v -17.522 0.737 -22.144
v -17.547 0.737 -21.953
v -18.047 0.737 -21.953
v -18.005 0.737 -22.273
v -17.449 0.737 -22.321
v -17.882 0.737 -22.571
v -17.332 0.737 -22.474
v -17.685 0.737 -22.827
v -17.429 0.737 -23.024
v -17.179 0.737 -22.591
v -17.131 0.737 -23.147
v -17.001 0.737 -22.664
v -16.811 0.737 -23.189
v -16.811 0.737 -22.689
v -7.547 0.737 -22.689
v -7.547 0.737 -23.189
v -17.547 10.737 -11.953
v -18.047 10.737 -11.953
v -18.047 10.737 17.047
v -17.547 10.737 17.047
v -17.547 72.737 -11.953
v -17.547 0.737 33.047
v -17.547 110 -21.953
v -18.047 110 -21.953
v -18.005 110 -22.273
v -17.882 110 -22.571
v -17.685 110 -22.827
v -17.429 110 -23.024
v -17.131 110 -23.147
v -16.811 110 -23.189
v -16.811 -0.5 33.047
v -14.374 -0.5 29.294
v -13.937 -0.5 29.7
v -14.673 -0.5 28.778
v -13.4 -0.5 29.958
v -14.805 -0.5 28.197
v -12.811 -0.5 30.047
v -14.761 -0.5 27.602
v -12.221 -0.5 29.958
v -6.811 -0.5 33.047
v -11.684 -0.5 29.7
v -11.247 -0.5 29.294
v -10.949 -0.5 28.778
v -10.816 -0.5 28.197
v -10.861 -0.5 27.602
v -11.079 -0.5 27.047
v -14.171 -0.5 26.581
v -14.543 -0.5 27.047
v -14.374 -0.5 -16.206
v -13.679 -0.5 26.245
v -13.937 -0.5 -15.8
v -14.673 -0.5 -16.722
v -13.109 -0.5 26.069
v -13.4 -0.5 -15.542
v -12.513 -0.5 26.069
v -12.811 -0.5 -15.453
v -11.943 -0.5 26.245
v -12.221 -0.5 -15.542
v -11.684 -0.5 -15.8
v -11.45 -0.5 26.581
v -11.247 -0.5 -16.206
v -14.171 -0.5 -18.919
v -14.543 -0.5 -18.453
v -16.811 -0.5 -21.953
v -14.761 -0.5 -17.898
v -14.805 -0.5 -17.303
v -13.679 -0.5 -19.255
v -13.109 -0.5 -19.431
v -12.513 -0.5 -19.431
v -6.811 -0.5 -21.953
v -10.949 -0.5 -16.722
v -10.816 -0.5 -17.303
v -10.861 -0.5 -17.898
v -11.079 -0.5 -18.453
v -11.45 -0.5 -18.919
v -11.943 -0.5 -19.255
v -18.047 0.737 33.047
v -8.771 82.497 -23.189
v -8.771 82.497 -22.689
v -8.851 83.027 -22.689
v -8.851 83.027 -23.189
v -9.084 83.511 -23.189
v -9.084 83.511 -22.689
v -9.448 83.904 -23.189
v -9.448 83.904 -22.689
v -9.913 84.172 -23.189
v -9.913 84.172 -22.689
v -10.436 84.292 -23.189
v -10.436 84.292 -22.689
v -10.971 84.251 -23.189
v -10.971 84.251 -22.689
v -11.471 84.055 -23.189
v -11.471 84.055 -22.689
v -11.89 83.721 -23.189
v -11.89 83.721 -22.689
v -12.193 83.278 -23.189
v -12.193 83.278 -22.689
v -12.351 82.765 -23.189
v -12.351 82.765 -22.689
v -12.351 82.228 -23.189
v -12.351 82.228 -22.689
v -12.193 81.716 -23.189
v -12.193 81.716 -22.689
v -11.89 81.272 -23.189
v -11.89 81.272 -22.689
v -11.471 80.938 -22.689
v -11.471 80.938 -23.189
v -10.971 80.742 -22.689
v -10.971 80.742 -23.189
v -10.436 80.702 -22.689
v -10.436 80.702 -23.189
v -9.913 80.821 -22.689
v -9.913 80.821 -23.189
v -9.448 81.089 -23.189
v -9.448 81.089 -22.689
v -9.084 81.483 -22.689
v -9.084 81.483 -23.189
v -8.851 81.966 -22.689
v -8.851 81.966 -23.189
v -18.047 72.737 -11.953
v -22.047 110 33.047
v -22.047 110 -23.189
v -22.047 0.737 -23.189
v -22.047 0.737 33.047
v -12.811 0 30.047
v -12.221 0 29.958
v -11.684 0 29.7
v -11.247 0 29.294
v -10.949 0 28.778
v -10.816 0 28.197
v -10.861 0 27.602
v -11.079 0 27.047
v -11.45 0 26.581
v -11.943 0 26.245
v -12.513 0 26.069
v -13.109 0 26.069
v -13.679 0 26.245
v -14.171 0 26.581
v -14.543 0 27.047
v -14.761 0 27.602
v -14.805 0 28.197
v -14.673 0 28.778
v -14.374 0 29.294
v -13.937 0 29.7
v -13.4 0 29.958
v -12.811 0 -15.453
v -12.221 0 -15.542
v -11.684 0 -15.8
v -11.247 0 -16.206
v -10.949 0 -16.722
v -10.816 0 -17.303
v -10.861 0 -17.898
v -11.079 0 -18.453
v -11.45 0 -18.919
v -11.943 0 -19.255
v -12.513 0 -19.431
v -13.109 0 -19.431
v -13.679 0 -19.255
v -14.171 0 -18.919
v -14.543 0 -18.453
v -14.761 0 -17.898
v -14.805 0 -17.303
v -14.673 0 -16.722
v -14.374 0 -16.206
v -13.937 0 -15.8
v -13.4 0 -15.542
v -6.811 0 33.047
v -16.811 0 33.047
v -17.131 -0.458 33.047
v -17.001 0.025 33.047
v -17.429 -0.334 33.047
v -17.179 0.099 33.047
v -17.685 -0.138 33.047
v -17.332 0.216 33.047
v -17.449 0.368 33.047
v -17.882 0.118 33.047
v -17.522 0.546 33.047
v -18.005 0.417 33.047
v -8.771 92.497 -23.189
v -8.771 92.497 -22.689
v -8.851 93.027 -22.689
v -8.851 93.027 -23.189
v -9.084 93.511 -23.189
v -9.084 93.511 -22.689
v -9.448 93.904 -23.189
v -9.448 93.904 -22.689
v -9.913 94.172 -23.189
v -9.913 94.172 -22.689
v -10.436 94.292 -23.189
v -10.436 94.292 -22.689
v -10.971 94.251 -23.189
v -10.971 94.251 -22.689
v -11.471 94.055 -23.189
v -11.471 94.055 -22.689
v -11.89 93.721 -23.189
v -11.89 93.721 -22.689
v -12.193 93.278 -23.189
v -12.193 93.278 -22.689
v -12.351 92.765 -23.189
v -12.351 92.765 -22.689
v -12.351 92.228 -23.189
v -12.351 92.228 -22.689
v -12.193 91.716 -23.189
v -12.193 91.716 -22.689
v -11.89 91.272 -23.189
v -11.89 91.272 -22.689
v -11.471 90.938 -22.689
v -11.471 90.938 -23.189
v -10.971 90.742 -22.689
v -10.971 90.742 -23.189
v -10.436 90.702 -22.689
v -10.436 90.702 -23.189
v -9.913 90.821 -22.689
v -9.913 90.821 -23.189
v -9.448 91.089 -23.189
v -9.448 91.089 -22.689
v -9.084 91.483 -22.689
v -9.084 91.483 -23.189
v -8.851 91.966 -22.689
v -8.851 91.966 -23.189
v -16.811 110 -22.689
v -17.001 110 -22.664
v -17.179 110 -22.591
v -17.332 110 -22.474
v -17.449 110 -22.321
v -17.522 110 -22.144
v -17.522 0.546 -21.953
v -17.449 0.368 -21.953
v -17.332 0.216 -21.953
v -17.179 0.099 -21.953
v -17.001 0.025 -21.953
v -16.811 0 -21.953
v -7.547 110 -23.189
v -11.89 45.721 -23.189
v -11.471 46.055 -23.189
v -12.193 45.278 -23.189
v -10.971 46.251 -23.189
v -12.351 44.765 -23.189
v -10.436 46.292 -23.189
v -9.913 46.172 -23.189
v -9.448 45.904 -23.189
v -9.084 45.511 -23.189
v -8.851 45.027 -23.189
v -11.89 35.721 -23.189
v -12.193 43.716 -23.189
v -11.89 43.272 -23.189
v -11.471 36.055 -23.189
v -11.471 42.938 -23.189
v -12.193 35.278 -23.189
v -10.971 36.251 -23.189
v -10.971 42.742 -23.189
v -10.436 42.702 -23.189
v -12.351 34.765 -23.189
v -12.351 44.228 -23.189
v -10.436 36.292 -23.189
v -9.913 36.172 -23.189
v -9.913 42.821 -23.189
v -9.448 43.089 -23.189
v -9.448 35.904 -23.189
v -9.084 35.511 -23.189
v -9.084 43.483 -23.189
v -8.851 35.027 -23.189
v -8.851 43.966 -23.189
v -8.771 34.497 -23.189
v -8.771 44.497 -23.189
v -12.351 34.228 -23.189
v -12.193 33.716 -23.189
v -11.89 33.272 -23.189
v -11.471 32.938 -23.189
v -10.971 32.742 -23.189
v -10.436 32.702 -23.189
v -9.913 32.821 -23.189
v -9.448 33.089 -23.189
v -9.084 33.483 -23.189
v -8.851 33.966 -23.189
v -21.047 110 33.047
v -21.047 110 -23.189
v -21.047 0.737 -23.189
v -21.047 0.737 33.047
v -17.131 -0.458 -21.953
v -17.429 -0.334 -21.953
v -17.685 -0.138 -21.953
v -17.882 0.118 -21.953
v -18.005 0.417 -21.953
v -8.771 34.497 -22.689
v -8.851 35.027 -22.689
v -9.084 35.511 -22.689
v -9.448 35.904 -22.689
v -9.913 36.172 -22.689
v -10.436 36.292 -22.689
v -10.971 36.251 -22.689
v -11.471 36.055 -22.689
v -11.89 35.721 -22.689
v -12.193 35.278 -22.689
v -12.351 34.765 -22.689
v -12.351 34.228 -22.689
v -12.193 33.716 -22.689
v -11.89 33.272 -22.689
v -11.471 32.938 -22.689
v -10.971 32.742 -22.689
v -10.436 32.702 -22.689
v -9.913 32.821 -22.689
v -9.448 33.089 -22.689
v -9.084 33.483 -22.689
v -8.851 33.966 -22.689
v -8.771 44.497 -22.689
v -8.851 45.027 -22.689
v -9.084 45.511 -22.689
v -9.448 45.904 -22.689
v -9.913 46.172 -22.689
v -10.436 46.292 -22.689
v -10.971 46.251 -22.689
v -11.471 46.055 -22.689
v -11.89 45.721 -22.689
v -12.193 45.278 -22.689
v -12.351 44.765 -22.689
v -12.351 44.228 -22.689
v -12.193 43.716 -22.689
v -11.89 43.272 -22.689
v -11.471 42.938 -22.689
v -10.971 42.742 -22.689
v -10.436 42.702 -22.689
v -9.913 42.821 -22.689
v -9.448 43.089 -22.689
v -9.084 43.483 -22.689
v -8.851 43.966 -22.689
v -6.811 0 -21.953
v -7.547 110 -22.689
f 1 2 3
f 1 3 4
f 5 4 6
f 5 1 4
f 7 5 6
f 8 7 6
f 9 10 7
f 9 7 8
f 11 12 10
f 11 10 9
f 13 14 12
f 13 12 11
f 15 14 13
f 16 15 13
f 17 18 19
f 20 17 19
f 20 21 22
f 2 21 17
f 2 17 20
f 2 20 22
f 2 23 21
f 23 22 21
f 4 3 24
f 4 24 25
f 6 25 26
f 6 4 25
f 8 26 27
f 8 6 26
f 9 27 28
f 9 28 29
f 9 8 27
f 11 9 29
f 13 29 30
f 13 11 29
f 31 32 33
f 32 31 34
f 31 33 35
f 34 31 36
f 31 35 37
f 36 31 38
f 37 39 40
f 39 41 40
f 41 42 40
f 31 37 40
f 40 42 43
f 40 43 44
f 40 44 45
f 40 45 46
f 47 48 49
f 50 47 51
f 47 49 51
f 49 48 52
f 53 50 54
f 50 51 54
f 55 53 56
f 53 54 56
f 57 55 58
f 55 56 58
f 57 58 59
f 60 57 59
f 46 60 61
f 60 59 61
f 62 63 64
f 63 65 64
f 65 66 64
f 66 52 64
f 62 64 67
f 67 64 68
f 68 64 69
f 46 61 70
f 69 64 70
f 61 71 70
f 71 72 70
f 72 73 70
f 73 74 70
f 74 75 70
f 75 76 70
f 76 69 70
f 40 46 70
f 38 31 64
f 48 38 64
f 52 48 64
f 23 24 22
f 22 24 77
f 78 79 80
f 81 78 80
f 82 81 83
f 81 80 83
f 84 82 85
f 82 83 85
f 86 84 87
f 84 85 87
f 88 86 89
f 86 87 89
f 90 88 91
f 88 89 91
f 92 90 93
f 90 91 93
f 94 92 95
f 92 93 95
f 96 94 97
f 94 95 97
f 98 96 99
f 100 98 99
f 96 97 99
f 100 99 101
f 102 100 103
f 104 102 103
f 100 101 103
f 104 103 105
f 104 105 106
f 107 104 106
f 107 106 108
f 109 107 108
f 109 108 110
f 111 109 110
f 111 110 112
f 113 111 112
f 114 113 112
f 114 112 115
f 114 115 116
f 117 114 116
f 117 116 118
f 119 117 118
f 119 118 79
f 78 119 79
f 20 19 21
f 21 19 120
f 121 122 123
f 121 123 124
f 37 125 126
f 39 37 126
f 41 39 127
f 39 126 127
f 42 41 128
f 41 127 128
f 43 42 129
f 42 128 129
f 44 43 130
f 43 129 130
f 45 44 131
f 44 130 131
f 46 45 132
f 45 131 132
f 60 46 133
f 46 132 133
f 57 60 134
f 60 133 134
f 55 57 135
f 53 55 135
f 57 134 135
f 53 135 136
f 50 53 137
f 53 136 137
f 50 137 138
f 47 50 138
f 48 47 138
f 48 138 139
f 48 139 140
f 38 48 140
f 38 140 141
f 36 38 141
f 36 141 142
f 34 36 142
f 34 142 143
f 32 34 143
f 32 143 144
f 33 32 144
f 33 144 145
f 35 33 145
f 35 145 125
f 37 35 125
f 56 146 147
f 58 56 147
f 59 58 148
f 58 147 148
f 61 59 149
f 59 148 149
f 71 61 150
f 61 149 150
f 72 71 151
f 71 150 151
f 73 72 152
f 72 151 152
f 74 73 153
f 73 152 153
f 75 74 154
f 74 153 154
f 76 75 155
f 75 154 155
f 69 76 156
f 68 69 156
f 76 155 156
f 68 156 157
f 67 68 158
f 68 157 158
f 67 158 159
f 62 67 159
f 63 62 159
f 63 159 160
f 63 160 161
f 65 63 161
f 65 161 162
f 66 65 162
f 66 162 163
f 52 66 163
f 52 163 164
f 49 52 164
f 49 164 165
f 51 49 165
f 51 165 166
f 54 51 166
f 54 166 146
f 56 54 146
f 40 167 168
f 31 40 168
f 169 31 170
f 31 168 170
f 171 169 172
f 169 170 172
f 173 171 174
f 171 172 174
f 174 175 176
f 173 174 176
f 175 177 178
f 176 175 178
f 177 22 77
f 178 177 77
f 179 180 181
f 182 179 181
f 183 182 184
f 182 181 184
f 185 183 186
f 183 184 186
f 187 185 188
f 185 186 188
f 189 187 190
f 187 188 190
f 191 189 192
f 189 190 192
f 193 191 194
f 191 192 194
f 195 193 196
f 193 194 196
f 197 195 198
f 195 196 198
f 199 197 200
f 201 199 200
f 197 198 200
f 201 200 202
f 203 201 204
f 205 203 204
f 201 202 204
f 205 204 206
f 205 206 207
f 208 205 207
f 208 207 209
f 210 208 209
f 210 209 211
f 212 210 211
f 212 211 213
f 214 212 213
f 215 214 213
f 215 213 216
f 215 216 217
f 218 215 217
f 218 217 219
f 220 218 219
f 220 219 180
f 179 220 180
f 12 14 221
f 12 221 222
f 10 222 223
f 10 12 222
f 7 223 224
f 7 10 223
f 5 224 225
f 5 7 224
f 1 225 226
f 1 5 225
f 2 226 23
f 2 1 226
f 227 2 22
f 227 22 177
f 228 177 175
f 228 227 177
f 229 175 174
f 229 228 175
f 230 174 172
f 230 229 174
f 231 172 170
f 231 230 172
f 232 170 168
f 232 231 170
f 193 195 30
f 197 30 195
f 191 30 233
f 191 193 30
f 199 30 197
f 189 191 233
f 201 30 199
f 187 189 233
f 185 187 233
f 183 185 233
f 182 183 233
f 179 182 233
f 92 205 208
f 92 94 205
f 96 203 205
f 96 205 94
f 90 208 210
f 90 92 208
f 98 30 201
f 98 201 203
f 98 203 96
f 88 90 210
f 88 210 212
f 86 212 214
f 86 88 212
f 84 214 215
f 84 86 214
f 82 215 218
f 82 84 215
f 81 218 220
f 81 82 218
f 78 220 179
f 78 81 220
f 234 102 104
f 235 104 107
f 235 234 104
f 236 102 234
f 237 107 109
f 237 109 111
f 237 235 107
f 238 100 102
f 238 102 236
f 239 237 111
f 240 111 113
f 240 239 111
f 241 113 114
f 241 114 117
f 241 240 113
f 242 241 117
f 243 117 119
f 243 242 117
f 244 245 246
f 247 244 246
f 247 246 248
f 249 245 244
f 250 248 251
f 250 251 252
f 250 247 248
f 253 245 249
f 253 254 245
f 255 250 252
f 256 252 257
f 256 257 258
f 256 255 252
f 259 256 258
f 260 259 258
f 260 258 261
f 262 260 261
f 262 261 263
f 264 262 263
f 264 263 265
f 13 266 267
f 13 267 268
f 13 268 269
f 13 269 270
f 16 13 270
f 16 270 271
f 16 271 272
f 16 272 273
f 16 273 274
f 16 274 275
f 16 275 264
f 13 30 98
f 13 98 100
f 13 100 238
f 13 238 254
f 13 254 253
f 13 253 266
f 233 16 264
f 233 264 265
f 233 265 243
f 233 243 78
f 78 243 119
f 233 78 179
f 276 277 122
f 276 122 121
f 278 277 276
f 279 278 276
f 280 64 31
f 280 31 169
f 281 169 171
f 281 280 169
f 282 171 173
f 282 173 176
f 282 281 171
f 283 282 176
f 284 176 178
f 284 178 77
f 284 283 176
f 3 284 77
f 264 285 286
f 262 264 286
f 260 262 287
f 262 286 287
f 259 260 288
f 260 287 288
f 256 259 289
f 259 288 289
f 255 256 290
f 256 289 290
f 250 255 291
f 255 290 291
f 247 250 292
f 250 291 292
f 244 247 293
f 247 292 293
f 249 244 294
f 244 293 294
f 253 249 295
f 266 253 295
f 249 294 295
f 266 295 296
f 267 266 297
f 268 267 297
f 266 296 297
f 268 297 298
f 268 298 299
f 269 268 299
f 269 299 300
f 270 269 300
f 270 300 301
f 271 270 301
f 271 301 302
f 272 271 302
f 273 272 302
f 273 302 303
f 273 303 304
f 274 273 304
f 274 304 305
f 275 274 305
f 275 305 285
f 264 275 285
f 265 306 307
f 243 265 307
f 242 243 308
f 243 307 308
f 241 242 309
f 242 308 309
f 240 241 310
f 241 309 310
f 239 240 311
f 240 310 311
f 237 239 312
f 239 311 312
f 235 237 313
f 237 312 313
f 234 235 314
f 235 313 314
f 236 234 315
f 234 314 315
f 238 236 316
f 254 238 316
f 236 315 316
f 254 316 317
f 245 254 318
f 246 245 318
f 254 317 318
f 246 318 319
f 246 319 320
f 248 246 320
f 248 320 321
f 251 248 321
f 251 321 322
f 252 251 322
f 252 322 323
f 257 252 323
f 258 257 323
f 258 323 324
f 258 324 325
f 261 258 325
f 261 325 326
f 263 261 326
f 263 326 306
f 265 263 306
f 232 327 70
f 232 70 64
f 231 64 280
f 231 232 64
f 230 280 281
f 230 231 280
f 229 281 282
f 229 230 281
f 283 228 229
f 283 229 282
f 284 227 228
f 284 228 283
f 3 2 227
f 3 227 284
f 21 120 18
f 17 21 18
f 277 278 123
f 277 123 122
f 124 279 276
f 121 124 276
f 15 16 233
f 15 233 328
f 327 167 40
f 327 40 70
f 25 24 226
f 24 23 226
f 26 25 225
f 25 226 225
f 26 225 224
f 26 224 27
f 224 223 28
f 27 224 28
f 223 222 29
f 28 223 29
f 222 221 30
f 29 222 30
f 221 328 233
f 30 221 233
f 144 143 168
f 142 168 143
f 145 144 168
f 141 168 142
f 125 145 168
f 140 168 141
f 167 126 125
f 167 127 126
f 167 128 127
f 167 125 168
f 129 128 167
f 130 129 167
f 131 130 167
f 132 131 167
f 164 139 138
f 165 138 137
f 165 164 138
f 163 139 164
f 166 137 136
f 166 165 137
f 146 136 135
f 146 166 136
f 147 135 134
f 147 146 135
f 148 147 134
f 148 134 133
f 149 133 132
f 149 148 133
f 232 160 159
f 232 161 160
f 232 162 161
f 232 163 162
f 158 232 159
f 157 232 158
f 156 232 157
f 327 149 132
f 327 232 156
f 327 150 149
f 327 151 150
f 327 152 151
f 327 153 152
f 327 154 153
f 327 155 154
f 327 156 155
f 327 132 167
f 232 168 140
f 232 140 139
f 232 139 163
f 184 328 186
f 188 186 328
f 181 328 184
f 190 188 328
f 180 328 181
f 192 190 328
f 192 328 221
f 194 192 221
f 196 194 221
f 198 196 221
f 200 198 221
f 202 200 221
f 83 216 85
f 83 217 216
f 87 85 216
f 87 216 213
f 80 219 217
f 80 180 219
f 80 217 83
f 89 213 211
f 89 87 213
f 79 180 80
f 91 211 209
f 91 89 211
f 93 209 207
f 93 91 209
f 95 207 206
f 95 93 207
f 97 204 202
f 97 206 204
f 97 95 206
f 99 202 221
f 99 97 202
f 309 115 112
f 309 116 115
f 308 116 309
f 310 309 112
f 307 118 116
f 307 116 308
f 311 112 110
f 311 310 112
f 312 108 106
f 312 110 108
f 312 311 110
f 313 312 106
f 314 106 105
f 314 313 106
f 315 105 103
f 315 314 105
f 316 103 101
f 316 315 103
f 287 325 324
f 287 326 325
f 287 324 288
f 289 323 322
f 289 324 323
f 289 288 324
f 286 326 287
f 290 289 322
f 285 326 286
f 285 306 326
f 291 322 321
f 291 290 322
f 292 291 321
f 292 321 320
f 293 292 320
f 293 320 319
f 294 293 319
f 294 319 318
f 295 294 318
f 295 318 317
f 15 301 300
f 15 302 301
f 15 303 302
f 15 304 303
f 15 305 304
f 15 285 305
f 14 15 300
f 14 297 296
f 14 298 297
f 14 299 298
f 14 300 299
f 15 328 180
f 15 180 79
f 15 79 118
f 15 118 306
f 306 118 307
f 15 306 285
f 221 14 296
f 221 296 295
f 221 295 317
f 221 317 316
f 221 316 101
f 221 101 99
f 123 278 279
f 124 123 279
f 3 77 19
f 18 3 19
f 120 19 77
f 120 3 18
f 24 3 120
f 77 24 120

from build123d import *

# Parameters (mm, degrees)
SKETCH1_W           = 10
SKETCH1_H           = 55
BASE_FLANGE1_DEPTH  = 0.5
EDGE_FLANGE1_DEPTH  = 55
EDGE_FLANGE2_DEPTH  = 109.2634
SKETCH13_R          = 2
CUT_EXTRUDE1_DEPTH  = 1
CUT_EXTRUDE2_DEPTH  = 10
CUT_EXTRUDE7_DEPTH  = 10
BOSS_EXTRUDE1_START = 3
SKETCH16_W          = 56.2366
SKETCH16_H          = 109.2634
BOSS_EXTRUDE1_DEPTH = 1
SKETCH19_R          = 1.8
CUT_EXTRUDE4_DEPTH  = 10
SKETCH17_R          = 1.8
CUT_EXTRUDE5_DEPTH  = 10
SKETCH20_R          = 1.8
CUT_EXTRUDE6_DEPTH  = 10


# Sheet-metal steps are written as plain solids
with BuildPart() as part:
    # Sketch1 → Base-Flange1 (new body)
    with BuildSketch(Plane(origin=(0, 0, 0), x_dir=(1, 0, 0), z_dir=(0, 1, 0))):
        with Locations((-11.810772495, -5.547108859)):
            Rectangle(SKETCH1_W, SKETCH1_H)
    extrude(amount=-BASE_FLANGE1_DEPTH)

    # Edge-Flange1 section (across the edge) → Edge-Flange1 (add)
    with BuildSketch(Plane(origin=(-17.547372495, 0, -21.952891141), x_dir=(1, 0, 0), z_dir=(0, 0, 1))):
        with BuildLine():
            Line((-0.5, 0.7366), (-0.5, 110))
            Line((-0.5, 110), (0, 110))
            Line((0, 110), (0, 0.7366))
            ThreePointArc((0, 0.7366), (0.215745145, 0.215745145), (0.7366, 0))
            Line((0.7366, 0), (0.7366, -0.5))
            ThreePointArc((0.7366, -0.5), (-0.137808246, -0.137808246), (-0.5, 0.7366))
        make_face()
    extrude(amount=EDGE_FLANGE1_DEPTH)

    # Edge-Flange2 section (across the edge) → Edge-Flange2 (add)
    with BuildSketch(Plane(origin=(-17.547372495, 0.7366, -22.689491141), x_dir=(0, 0, 1), z_dir=(0, 1, 0))):
        with BuildLine():
            Line((-0.5, 0.7366), (-0.5, 10))
            Line((-0.5, 10), (0, 10))
            Line((0, 10), (0, 0.7366))
            ThreePointArc((0, 0.7366), (0.215745145, 0.215745145), (0.7366, 0))
            Line((0.7366, 0), (0.7366, -0.5))
            ThreePointArc((0.7366, -0.5), (-0.137808246, -0.137808246), (-0.5, 0.7366))
        make_face()
    extrude(amount=EDGE_FLANGE2_DEPTH)

    # Sketch13 → Cut-Extrude1 (cut)
    with BuildSketch(Plane(origin=(0, 0, 0), x_dir=(1, 0, 0), z_dir=(0, 1, 0))):
        with Locations(Location((-12.810772495, 17.452891141, 0), (0, 0, 270))):
            Circle(SKETCH13_R)
        with Locations(Location((-12.810772495, -28.047108859, 0), (0, 0, 270))):
            Circle(SKETCH13_R)
    extrude(amount=-CUT_EXTRUDE1_DEPTH, mode=Mode.SUBTRACT)

    # Sketch14 → Cut-Extrude2 (cut)
    with BuildSketch(Plane.ZY.offset(18.047372495)):
        Polygon((-21.952891141, 110), (33.047108859, 0.7366), (33.047108859, 110), align=None)
    extrude(amount=-CUT_EXTRUDE2_DEPTH, mode=Mode.SUBTRACT)

    # Sketch21 → Cut-Extrude7 (cut)
    with BuildSketch(Plane.ZY.offset(18.047372495)):
        Polygon((-11.952891141, 72.7366), (-11.952891141, 10.7366), (17.047108859, 10.7366), align=None)
    extrude(amount=-CUT_EXTRUDE7_DEPTH, mode=Mode.SUBTRACT)

    # Sketch19 → Cut-Extrude4 (cut)
    with BuildSketch(Plane.XY.offset(-22.689491141)):
        with Locations((-10.570772495, 34.4966)):
            Circle(SKETCH19_R)
    extrude(amount=-CUT_EXTRUDE4_DEPTH, mode=Mode.SUBTRACT)

    # Sketch17 → Cut-Extrude5 (cut)
    with BuildSketch(Plane.XY.offset(-22.689491141)):
        with Locations((-10.570772495, 44.4966)):
            Circle(SKETCH17_R)
    extrude(amount=-CUT_EXTRUDE5_DEPTH, mode=Mode.SUBTRACT)

    # Sketch20 → Cut-Extrude6 (cut)
    with BuildSketch(Plane.XY.offset(-22.689491141)):
        with Locations((-10.570772495, 82.4966)):
            Circle(SKETCH20_R)
        with Locations((-10.570772495, 92.4966)):
            Circle(SKETCH20_R)
    extrude(amount=-CUT_EXTRUDE6_DEPTH, mode=Mode.SUBTRACT)


with BuildPart() as body_2:
    # Sketch16 → Boss-Extrude1 (new body)
    with BuildSketch(Plane.ZY.offset(18.047372495).offset(BOSS_EXTRUDE1_START)):
        with Locations((4.928808859, 55.3683)):
            Rectangle(SKETCH16_W, SKETCH16_H)
    extrude(amount=BOSS_EXTRUDE1_DEPTH)


solid = Compound([part.part, body_2.part])
